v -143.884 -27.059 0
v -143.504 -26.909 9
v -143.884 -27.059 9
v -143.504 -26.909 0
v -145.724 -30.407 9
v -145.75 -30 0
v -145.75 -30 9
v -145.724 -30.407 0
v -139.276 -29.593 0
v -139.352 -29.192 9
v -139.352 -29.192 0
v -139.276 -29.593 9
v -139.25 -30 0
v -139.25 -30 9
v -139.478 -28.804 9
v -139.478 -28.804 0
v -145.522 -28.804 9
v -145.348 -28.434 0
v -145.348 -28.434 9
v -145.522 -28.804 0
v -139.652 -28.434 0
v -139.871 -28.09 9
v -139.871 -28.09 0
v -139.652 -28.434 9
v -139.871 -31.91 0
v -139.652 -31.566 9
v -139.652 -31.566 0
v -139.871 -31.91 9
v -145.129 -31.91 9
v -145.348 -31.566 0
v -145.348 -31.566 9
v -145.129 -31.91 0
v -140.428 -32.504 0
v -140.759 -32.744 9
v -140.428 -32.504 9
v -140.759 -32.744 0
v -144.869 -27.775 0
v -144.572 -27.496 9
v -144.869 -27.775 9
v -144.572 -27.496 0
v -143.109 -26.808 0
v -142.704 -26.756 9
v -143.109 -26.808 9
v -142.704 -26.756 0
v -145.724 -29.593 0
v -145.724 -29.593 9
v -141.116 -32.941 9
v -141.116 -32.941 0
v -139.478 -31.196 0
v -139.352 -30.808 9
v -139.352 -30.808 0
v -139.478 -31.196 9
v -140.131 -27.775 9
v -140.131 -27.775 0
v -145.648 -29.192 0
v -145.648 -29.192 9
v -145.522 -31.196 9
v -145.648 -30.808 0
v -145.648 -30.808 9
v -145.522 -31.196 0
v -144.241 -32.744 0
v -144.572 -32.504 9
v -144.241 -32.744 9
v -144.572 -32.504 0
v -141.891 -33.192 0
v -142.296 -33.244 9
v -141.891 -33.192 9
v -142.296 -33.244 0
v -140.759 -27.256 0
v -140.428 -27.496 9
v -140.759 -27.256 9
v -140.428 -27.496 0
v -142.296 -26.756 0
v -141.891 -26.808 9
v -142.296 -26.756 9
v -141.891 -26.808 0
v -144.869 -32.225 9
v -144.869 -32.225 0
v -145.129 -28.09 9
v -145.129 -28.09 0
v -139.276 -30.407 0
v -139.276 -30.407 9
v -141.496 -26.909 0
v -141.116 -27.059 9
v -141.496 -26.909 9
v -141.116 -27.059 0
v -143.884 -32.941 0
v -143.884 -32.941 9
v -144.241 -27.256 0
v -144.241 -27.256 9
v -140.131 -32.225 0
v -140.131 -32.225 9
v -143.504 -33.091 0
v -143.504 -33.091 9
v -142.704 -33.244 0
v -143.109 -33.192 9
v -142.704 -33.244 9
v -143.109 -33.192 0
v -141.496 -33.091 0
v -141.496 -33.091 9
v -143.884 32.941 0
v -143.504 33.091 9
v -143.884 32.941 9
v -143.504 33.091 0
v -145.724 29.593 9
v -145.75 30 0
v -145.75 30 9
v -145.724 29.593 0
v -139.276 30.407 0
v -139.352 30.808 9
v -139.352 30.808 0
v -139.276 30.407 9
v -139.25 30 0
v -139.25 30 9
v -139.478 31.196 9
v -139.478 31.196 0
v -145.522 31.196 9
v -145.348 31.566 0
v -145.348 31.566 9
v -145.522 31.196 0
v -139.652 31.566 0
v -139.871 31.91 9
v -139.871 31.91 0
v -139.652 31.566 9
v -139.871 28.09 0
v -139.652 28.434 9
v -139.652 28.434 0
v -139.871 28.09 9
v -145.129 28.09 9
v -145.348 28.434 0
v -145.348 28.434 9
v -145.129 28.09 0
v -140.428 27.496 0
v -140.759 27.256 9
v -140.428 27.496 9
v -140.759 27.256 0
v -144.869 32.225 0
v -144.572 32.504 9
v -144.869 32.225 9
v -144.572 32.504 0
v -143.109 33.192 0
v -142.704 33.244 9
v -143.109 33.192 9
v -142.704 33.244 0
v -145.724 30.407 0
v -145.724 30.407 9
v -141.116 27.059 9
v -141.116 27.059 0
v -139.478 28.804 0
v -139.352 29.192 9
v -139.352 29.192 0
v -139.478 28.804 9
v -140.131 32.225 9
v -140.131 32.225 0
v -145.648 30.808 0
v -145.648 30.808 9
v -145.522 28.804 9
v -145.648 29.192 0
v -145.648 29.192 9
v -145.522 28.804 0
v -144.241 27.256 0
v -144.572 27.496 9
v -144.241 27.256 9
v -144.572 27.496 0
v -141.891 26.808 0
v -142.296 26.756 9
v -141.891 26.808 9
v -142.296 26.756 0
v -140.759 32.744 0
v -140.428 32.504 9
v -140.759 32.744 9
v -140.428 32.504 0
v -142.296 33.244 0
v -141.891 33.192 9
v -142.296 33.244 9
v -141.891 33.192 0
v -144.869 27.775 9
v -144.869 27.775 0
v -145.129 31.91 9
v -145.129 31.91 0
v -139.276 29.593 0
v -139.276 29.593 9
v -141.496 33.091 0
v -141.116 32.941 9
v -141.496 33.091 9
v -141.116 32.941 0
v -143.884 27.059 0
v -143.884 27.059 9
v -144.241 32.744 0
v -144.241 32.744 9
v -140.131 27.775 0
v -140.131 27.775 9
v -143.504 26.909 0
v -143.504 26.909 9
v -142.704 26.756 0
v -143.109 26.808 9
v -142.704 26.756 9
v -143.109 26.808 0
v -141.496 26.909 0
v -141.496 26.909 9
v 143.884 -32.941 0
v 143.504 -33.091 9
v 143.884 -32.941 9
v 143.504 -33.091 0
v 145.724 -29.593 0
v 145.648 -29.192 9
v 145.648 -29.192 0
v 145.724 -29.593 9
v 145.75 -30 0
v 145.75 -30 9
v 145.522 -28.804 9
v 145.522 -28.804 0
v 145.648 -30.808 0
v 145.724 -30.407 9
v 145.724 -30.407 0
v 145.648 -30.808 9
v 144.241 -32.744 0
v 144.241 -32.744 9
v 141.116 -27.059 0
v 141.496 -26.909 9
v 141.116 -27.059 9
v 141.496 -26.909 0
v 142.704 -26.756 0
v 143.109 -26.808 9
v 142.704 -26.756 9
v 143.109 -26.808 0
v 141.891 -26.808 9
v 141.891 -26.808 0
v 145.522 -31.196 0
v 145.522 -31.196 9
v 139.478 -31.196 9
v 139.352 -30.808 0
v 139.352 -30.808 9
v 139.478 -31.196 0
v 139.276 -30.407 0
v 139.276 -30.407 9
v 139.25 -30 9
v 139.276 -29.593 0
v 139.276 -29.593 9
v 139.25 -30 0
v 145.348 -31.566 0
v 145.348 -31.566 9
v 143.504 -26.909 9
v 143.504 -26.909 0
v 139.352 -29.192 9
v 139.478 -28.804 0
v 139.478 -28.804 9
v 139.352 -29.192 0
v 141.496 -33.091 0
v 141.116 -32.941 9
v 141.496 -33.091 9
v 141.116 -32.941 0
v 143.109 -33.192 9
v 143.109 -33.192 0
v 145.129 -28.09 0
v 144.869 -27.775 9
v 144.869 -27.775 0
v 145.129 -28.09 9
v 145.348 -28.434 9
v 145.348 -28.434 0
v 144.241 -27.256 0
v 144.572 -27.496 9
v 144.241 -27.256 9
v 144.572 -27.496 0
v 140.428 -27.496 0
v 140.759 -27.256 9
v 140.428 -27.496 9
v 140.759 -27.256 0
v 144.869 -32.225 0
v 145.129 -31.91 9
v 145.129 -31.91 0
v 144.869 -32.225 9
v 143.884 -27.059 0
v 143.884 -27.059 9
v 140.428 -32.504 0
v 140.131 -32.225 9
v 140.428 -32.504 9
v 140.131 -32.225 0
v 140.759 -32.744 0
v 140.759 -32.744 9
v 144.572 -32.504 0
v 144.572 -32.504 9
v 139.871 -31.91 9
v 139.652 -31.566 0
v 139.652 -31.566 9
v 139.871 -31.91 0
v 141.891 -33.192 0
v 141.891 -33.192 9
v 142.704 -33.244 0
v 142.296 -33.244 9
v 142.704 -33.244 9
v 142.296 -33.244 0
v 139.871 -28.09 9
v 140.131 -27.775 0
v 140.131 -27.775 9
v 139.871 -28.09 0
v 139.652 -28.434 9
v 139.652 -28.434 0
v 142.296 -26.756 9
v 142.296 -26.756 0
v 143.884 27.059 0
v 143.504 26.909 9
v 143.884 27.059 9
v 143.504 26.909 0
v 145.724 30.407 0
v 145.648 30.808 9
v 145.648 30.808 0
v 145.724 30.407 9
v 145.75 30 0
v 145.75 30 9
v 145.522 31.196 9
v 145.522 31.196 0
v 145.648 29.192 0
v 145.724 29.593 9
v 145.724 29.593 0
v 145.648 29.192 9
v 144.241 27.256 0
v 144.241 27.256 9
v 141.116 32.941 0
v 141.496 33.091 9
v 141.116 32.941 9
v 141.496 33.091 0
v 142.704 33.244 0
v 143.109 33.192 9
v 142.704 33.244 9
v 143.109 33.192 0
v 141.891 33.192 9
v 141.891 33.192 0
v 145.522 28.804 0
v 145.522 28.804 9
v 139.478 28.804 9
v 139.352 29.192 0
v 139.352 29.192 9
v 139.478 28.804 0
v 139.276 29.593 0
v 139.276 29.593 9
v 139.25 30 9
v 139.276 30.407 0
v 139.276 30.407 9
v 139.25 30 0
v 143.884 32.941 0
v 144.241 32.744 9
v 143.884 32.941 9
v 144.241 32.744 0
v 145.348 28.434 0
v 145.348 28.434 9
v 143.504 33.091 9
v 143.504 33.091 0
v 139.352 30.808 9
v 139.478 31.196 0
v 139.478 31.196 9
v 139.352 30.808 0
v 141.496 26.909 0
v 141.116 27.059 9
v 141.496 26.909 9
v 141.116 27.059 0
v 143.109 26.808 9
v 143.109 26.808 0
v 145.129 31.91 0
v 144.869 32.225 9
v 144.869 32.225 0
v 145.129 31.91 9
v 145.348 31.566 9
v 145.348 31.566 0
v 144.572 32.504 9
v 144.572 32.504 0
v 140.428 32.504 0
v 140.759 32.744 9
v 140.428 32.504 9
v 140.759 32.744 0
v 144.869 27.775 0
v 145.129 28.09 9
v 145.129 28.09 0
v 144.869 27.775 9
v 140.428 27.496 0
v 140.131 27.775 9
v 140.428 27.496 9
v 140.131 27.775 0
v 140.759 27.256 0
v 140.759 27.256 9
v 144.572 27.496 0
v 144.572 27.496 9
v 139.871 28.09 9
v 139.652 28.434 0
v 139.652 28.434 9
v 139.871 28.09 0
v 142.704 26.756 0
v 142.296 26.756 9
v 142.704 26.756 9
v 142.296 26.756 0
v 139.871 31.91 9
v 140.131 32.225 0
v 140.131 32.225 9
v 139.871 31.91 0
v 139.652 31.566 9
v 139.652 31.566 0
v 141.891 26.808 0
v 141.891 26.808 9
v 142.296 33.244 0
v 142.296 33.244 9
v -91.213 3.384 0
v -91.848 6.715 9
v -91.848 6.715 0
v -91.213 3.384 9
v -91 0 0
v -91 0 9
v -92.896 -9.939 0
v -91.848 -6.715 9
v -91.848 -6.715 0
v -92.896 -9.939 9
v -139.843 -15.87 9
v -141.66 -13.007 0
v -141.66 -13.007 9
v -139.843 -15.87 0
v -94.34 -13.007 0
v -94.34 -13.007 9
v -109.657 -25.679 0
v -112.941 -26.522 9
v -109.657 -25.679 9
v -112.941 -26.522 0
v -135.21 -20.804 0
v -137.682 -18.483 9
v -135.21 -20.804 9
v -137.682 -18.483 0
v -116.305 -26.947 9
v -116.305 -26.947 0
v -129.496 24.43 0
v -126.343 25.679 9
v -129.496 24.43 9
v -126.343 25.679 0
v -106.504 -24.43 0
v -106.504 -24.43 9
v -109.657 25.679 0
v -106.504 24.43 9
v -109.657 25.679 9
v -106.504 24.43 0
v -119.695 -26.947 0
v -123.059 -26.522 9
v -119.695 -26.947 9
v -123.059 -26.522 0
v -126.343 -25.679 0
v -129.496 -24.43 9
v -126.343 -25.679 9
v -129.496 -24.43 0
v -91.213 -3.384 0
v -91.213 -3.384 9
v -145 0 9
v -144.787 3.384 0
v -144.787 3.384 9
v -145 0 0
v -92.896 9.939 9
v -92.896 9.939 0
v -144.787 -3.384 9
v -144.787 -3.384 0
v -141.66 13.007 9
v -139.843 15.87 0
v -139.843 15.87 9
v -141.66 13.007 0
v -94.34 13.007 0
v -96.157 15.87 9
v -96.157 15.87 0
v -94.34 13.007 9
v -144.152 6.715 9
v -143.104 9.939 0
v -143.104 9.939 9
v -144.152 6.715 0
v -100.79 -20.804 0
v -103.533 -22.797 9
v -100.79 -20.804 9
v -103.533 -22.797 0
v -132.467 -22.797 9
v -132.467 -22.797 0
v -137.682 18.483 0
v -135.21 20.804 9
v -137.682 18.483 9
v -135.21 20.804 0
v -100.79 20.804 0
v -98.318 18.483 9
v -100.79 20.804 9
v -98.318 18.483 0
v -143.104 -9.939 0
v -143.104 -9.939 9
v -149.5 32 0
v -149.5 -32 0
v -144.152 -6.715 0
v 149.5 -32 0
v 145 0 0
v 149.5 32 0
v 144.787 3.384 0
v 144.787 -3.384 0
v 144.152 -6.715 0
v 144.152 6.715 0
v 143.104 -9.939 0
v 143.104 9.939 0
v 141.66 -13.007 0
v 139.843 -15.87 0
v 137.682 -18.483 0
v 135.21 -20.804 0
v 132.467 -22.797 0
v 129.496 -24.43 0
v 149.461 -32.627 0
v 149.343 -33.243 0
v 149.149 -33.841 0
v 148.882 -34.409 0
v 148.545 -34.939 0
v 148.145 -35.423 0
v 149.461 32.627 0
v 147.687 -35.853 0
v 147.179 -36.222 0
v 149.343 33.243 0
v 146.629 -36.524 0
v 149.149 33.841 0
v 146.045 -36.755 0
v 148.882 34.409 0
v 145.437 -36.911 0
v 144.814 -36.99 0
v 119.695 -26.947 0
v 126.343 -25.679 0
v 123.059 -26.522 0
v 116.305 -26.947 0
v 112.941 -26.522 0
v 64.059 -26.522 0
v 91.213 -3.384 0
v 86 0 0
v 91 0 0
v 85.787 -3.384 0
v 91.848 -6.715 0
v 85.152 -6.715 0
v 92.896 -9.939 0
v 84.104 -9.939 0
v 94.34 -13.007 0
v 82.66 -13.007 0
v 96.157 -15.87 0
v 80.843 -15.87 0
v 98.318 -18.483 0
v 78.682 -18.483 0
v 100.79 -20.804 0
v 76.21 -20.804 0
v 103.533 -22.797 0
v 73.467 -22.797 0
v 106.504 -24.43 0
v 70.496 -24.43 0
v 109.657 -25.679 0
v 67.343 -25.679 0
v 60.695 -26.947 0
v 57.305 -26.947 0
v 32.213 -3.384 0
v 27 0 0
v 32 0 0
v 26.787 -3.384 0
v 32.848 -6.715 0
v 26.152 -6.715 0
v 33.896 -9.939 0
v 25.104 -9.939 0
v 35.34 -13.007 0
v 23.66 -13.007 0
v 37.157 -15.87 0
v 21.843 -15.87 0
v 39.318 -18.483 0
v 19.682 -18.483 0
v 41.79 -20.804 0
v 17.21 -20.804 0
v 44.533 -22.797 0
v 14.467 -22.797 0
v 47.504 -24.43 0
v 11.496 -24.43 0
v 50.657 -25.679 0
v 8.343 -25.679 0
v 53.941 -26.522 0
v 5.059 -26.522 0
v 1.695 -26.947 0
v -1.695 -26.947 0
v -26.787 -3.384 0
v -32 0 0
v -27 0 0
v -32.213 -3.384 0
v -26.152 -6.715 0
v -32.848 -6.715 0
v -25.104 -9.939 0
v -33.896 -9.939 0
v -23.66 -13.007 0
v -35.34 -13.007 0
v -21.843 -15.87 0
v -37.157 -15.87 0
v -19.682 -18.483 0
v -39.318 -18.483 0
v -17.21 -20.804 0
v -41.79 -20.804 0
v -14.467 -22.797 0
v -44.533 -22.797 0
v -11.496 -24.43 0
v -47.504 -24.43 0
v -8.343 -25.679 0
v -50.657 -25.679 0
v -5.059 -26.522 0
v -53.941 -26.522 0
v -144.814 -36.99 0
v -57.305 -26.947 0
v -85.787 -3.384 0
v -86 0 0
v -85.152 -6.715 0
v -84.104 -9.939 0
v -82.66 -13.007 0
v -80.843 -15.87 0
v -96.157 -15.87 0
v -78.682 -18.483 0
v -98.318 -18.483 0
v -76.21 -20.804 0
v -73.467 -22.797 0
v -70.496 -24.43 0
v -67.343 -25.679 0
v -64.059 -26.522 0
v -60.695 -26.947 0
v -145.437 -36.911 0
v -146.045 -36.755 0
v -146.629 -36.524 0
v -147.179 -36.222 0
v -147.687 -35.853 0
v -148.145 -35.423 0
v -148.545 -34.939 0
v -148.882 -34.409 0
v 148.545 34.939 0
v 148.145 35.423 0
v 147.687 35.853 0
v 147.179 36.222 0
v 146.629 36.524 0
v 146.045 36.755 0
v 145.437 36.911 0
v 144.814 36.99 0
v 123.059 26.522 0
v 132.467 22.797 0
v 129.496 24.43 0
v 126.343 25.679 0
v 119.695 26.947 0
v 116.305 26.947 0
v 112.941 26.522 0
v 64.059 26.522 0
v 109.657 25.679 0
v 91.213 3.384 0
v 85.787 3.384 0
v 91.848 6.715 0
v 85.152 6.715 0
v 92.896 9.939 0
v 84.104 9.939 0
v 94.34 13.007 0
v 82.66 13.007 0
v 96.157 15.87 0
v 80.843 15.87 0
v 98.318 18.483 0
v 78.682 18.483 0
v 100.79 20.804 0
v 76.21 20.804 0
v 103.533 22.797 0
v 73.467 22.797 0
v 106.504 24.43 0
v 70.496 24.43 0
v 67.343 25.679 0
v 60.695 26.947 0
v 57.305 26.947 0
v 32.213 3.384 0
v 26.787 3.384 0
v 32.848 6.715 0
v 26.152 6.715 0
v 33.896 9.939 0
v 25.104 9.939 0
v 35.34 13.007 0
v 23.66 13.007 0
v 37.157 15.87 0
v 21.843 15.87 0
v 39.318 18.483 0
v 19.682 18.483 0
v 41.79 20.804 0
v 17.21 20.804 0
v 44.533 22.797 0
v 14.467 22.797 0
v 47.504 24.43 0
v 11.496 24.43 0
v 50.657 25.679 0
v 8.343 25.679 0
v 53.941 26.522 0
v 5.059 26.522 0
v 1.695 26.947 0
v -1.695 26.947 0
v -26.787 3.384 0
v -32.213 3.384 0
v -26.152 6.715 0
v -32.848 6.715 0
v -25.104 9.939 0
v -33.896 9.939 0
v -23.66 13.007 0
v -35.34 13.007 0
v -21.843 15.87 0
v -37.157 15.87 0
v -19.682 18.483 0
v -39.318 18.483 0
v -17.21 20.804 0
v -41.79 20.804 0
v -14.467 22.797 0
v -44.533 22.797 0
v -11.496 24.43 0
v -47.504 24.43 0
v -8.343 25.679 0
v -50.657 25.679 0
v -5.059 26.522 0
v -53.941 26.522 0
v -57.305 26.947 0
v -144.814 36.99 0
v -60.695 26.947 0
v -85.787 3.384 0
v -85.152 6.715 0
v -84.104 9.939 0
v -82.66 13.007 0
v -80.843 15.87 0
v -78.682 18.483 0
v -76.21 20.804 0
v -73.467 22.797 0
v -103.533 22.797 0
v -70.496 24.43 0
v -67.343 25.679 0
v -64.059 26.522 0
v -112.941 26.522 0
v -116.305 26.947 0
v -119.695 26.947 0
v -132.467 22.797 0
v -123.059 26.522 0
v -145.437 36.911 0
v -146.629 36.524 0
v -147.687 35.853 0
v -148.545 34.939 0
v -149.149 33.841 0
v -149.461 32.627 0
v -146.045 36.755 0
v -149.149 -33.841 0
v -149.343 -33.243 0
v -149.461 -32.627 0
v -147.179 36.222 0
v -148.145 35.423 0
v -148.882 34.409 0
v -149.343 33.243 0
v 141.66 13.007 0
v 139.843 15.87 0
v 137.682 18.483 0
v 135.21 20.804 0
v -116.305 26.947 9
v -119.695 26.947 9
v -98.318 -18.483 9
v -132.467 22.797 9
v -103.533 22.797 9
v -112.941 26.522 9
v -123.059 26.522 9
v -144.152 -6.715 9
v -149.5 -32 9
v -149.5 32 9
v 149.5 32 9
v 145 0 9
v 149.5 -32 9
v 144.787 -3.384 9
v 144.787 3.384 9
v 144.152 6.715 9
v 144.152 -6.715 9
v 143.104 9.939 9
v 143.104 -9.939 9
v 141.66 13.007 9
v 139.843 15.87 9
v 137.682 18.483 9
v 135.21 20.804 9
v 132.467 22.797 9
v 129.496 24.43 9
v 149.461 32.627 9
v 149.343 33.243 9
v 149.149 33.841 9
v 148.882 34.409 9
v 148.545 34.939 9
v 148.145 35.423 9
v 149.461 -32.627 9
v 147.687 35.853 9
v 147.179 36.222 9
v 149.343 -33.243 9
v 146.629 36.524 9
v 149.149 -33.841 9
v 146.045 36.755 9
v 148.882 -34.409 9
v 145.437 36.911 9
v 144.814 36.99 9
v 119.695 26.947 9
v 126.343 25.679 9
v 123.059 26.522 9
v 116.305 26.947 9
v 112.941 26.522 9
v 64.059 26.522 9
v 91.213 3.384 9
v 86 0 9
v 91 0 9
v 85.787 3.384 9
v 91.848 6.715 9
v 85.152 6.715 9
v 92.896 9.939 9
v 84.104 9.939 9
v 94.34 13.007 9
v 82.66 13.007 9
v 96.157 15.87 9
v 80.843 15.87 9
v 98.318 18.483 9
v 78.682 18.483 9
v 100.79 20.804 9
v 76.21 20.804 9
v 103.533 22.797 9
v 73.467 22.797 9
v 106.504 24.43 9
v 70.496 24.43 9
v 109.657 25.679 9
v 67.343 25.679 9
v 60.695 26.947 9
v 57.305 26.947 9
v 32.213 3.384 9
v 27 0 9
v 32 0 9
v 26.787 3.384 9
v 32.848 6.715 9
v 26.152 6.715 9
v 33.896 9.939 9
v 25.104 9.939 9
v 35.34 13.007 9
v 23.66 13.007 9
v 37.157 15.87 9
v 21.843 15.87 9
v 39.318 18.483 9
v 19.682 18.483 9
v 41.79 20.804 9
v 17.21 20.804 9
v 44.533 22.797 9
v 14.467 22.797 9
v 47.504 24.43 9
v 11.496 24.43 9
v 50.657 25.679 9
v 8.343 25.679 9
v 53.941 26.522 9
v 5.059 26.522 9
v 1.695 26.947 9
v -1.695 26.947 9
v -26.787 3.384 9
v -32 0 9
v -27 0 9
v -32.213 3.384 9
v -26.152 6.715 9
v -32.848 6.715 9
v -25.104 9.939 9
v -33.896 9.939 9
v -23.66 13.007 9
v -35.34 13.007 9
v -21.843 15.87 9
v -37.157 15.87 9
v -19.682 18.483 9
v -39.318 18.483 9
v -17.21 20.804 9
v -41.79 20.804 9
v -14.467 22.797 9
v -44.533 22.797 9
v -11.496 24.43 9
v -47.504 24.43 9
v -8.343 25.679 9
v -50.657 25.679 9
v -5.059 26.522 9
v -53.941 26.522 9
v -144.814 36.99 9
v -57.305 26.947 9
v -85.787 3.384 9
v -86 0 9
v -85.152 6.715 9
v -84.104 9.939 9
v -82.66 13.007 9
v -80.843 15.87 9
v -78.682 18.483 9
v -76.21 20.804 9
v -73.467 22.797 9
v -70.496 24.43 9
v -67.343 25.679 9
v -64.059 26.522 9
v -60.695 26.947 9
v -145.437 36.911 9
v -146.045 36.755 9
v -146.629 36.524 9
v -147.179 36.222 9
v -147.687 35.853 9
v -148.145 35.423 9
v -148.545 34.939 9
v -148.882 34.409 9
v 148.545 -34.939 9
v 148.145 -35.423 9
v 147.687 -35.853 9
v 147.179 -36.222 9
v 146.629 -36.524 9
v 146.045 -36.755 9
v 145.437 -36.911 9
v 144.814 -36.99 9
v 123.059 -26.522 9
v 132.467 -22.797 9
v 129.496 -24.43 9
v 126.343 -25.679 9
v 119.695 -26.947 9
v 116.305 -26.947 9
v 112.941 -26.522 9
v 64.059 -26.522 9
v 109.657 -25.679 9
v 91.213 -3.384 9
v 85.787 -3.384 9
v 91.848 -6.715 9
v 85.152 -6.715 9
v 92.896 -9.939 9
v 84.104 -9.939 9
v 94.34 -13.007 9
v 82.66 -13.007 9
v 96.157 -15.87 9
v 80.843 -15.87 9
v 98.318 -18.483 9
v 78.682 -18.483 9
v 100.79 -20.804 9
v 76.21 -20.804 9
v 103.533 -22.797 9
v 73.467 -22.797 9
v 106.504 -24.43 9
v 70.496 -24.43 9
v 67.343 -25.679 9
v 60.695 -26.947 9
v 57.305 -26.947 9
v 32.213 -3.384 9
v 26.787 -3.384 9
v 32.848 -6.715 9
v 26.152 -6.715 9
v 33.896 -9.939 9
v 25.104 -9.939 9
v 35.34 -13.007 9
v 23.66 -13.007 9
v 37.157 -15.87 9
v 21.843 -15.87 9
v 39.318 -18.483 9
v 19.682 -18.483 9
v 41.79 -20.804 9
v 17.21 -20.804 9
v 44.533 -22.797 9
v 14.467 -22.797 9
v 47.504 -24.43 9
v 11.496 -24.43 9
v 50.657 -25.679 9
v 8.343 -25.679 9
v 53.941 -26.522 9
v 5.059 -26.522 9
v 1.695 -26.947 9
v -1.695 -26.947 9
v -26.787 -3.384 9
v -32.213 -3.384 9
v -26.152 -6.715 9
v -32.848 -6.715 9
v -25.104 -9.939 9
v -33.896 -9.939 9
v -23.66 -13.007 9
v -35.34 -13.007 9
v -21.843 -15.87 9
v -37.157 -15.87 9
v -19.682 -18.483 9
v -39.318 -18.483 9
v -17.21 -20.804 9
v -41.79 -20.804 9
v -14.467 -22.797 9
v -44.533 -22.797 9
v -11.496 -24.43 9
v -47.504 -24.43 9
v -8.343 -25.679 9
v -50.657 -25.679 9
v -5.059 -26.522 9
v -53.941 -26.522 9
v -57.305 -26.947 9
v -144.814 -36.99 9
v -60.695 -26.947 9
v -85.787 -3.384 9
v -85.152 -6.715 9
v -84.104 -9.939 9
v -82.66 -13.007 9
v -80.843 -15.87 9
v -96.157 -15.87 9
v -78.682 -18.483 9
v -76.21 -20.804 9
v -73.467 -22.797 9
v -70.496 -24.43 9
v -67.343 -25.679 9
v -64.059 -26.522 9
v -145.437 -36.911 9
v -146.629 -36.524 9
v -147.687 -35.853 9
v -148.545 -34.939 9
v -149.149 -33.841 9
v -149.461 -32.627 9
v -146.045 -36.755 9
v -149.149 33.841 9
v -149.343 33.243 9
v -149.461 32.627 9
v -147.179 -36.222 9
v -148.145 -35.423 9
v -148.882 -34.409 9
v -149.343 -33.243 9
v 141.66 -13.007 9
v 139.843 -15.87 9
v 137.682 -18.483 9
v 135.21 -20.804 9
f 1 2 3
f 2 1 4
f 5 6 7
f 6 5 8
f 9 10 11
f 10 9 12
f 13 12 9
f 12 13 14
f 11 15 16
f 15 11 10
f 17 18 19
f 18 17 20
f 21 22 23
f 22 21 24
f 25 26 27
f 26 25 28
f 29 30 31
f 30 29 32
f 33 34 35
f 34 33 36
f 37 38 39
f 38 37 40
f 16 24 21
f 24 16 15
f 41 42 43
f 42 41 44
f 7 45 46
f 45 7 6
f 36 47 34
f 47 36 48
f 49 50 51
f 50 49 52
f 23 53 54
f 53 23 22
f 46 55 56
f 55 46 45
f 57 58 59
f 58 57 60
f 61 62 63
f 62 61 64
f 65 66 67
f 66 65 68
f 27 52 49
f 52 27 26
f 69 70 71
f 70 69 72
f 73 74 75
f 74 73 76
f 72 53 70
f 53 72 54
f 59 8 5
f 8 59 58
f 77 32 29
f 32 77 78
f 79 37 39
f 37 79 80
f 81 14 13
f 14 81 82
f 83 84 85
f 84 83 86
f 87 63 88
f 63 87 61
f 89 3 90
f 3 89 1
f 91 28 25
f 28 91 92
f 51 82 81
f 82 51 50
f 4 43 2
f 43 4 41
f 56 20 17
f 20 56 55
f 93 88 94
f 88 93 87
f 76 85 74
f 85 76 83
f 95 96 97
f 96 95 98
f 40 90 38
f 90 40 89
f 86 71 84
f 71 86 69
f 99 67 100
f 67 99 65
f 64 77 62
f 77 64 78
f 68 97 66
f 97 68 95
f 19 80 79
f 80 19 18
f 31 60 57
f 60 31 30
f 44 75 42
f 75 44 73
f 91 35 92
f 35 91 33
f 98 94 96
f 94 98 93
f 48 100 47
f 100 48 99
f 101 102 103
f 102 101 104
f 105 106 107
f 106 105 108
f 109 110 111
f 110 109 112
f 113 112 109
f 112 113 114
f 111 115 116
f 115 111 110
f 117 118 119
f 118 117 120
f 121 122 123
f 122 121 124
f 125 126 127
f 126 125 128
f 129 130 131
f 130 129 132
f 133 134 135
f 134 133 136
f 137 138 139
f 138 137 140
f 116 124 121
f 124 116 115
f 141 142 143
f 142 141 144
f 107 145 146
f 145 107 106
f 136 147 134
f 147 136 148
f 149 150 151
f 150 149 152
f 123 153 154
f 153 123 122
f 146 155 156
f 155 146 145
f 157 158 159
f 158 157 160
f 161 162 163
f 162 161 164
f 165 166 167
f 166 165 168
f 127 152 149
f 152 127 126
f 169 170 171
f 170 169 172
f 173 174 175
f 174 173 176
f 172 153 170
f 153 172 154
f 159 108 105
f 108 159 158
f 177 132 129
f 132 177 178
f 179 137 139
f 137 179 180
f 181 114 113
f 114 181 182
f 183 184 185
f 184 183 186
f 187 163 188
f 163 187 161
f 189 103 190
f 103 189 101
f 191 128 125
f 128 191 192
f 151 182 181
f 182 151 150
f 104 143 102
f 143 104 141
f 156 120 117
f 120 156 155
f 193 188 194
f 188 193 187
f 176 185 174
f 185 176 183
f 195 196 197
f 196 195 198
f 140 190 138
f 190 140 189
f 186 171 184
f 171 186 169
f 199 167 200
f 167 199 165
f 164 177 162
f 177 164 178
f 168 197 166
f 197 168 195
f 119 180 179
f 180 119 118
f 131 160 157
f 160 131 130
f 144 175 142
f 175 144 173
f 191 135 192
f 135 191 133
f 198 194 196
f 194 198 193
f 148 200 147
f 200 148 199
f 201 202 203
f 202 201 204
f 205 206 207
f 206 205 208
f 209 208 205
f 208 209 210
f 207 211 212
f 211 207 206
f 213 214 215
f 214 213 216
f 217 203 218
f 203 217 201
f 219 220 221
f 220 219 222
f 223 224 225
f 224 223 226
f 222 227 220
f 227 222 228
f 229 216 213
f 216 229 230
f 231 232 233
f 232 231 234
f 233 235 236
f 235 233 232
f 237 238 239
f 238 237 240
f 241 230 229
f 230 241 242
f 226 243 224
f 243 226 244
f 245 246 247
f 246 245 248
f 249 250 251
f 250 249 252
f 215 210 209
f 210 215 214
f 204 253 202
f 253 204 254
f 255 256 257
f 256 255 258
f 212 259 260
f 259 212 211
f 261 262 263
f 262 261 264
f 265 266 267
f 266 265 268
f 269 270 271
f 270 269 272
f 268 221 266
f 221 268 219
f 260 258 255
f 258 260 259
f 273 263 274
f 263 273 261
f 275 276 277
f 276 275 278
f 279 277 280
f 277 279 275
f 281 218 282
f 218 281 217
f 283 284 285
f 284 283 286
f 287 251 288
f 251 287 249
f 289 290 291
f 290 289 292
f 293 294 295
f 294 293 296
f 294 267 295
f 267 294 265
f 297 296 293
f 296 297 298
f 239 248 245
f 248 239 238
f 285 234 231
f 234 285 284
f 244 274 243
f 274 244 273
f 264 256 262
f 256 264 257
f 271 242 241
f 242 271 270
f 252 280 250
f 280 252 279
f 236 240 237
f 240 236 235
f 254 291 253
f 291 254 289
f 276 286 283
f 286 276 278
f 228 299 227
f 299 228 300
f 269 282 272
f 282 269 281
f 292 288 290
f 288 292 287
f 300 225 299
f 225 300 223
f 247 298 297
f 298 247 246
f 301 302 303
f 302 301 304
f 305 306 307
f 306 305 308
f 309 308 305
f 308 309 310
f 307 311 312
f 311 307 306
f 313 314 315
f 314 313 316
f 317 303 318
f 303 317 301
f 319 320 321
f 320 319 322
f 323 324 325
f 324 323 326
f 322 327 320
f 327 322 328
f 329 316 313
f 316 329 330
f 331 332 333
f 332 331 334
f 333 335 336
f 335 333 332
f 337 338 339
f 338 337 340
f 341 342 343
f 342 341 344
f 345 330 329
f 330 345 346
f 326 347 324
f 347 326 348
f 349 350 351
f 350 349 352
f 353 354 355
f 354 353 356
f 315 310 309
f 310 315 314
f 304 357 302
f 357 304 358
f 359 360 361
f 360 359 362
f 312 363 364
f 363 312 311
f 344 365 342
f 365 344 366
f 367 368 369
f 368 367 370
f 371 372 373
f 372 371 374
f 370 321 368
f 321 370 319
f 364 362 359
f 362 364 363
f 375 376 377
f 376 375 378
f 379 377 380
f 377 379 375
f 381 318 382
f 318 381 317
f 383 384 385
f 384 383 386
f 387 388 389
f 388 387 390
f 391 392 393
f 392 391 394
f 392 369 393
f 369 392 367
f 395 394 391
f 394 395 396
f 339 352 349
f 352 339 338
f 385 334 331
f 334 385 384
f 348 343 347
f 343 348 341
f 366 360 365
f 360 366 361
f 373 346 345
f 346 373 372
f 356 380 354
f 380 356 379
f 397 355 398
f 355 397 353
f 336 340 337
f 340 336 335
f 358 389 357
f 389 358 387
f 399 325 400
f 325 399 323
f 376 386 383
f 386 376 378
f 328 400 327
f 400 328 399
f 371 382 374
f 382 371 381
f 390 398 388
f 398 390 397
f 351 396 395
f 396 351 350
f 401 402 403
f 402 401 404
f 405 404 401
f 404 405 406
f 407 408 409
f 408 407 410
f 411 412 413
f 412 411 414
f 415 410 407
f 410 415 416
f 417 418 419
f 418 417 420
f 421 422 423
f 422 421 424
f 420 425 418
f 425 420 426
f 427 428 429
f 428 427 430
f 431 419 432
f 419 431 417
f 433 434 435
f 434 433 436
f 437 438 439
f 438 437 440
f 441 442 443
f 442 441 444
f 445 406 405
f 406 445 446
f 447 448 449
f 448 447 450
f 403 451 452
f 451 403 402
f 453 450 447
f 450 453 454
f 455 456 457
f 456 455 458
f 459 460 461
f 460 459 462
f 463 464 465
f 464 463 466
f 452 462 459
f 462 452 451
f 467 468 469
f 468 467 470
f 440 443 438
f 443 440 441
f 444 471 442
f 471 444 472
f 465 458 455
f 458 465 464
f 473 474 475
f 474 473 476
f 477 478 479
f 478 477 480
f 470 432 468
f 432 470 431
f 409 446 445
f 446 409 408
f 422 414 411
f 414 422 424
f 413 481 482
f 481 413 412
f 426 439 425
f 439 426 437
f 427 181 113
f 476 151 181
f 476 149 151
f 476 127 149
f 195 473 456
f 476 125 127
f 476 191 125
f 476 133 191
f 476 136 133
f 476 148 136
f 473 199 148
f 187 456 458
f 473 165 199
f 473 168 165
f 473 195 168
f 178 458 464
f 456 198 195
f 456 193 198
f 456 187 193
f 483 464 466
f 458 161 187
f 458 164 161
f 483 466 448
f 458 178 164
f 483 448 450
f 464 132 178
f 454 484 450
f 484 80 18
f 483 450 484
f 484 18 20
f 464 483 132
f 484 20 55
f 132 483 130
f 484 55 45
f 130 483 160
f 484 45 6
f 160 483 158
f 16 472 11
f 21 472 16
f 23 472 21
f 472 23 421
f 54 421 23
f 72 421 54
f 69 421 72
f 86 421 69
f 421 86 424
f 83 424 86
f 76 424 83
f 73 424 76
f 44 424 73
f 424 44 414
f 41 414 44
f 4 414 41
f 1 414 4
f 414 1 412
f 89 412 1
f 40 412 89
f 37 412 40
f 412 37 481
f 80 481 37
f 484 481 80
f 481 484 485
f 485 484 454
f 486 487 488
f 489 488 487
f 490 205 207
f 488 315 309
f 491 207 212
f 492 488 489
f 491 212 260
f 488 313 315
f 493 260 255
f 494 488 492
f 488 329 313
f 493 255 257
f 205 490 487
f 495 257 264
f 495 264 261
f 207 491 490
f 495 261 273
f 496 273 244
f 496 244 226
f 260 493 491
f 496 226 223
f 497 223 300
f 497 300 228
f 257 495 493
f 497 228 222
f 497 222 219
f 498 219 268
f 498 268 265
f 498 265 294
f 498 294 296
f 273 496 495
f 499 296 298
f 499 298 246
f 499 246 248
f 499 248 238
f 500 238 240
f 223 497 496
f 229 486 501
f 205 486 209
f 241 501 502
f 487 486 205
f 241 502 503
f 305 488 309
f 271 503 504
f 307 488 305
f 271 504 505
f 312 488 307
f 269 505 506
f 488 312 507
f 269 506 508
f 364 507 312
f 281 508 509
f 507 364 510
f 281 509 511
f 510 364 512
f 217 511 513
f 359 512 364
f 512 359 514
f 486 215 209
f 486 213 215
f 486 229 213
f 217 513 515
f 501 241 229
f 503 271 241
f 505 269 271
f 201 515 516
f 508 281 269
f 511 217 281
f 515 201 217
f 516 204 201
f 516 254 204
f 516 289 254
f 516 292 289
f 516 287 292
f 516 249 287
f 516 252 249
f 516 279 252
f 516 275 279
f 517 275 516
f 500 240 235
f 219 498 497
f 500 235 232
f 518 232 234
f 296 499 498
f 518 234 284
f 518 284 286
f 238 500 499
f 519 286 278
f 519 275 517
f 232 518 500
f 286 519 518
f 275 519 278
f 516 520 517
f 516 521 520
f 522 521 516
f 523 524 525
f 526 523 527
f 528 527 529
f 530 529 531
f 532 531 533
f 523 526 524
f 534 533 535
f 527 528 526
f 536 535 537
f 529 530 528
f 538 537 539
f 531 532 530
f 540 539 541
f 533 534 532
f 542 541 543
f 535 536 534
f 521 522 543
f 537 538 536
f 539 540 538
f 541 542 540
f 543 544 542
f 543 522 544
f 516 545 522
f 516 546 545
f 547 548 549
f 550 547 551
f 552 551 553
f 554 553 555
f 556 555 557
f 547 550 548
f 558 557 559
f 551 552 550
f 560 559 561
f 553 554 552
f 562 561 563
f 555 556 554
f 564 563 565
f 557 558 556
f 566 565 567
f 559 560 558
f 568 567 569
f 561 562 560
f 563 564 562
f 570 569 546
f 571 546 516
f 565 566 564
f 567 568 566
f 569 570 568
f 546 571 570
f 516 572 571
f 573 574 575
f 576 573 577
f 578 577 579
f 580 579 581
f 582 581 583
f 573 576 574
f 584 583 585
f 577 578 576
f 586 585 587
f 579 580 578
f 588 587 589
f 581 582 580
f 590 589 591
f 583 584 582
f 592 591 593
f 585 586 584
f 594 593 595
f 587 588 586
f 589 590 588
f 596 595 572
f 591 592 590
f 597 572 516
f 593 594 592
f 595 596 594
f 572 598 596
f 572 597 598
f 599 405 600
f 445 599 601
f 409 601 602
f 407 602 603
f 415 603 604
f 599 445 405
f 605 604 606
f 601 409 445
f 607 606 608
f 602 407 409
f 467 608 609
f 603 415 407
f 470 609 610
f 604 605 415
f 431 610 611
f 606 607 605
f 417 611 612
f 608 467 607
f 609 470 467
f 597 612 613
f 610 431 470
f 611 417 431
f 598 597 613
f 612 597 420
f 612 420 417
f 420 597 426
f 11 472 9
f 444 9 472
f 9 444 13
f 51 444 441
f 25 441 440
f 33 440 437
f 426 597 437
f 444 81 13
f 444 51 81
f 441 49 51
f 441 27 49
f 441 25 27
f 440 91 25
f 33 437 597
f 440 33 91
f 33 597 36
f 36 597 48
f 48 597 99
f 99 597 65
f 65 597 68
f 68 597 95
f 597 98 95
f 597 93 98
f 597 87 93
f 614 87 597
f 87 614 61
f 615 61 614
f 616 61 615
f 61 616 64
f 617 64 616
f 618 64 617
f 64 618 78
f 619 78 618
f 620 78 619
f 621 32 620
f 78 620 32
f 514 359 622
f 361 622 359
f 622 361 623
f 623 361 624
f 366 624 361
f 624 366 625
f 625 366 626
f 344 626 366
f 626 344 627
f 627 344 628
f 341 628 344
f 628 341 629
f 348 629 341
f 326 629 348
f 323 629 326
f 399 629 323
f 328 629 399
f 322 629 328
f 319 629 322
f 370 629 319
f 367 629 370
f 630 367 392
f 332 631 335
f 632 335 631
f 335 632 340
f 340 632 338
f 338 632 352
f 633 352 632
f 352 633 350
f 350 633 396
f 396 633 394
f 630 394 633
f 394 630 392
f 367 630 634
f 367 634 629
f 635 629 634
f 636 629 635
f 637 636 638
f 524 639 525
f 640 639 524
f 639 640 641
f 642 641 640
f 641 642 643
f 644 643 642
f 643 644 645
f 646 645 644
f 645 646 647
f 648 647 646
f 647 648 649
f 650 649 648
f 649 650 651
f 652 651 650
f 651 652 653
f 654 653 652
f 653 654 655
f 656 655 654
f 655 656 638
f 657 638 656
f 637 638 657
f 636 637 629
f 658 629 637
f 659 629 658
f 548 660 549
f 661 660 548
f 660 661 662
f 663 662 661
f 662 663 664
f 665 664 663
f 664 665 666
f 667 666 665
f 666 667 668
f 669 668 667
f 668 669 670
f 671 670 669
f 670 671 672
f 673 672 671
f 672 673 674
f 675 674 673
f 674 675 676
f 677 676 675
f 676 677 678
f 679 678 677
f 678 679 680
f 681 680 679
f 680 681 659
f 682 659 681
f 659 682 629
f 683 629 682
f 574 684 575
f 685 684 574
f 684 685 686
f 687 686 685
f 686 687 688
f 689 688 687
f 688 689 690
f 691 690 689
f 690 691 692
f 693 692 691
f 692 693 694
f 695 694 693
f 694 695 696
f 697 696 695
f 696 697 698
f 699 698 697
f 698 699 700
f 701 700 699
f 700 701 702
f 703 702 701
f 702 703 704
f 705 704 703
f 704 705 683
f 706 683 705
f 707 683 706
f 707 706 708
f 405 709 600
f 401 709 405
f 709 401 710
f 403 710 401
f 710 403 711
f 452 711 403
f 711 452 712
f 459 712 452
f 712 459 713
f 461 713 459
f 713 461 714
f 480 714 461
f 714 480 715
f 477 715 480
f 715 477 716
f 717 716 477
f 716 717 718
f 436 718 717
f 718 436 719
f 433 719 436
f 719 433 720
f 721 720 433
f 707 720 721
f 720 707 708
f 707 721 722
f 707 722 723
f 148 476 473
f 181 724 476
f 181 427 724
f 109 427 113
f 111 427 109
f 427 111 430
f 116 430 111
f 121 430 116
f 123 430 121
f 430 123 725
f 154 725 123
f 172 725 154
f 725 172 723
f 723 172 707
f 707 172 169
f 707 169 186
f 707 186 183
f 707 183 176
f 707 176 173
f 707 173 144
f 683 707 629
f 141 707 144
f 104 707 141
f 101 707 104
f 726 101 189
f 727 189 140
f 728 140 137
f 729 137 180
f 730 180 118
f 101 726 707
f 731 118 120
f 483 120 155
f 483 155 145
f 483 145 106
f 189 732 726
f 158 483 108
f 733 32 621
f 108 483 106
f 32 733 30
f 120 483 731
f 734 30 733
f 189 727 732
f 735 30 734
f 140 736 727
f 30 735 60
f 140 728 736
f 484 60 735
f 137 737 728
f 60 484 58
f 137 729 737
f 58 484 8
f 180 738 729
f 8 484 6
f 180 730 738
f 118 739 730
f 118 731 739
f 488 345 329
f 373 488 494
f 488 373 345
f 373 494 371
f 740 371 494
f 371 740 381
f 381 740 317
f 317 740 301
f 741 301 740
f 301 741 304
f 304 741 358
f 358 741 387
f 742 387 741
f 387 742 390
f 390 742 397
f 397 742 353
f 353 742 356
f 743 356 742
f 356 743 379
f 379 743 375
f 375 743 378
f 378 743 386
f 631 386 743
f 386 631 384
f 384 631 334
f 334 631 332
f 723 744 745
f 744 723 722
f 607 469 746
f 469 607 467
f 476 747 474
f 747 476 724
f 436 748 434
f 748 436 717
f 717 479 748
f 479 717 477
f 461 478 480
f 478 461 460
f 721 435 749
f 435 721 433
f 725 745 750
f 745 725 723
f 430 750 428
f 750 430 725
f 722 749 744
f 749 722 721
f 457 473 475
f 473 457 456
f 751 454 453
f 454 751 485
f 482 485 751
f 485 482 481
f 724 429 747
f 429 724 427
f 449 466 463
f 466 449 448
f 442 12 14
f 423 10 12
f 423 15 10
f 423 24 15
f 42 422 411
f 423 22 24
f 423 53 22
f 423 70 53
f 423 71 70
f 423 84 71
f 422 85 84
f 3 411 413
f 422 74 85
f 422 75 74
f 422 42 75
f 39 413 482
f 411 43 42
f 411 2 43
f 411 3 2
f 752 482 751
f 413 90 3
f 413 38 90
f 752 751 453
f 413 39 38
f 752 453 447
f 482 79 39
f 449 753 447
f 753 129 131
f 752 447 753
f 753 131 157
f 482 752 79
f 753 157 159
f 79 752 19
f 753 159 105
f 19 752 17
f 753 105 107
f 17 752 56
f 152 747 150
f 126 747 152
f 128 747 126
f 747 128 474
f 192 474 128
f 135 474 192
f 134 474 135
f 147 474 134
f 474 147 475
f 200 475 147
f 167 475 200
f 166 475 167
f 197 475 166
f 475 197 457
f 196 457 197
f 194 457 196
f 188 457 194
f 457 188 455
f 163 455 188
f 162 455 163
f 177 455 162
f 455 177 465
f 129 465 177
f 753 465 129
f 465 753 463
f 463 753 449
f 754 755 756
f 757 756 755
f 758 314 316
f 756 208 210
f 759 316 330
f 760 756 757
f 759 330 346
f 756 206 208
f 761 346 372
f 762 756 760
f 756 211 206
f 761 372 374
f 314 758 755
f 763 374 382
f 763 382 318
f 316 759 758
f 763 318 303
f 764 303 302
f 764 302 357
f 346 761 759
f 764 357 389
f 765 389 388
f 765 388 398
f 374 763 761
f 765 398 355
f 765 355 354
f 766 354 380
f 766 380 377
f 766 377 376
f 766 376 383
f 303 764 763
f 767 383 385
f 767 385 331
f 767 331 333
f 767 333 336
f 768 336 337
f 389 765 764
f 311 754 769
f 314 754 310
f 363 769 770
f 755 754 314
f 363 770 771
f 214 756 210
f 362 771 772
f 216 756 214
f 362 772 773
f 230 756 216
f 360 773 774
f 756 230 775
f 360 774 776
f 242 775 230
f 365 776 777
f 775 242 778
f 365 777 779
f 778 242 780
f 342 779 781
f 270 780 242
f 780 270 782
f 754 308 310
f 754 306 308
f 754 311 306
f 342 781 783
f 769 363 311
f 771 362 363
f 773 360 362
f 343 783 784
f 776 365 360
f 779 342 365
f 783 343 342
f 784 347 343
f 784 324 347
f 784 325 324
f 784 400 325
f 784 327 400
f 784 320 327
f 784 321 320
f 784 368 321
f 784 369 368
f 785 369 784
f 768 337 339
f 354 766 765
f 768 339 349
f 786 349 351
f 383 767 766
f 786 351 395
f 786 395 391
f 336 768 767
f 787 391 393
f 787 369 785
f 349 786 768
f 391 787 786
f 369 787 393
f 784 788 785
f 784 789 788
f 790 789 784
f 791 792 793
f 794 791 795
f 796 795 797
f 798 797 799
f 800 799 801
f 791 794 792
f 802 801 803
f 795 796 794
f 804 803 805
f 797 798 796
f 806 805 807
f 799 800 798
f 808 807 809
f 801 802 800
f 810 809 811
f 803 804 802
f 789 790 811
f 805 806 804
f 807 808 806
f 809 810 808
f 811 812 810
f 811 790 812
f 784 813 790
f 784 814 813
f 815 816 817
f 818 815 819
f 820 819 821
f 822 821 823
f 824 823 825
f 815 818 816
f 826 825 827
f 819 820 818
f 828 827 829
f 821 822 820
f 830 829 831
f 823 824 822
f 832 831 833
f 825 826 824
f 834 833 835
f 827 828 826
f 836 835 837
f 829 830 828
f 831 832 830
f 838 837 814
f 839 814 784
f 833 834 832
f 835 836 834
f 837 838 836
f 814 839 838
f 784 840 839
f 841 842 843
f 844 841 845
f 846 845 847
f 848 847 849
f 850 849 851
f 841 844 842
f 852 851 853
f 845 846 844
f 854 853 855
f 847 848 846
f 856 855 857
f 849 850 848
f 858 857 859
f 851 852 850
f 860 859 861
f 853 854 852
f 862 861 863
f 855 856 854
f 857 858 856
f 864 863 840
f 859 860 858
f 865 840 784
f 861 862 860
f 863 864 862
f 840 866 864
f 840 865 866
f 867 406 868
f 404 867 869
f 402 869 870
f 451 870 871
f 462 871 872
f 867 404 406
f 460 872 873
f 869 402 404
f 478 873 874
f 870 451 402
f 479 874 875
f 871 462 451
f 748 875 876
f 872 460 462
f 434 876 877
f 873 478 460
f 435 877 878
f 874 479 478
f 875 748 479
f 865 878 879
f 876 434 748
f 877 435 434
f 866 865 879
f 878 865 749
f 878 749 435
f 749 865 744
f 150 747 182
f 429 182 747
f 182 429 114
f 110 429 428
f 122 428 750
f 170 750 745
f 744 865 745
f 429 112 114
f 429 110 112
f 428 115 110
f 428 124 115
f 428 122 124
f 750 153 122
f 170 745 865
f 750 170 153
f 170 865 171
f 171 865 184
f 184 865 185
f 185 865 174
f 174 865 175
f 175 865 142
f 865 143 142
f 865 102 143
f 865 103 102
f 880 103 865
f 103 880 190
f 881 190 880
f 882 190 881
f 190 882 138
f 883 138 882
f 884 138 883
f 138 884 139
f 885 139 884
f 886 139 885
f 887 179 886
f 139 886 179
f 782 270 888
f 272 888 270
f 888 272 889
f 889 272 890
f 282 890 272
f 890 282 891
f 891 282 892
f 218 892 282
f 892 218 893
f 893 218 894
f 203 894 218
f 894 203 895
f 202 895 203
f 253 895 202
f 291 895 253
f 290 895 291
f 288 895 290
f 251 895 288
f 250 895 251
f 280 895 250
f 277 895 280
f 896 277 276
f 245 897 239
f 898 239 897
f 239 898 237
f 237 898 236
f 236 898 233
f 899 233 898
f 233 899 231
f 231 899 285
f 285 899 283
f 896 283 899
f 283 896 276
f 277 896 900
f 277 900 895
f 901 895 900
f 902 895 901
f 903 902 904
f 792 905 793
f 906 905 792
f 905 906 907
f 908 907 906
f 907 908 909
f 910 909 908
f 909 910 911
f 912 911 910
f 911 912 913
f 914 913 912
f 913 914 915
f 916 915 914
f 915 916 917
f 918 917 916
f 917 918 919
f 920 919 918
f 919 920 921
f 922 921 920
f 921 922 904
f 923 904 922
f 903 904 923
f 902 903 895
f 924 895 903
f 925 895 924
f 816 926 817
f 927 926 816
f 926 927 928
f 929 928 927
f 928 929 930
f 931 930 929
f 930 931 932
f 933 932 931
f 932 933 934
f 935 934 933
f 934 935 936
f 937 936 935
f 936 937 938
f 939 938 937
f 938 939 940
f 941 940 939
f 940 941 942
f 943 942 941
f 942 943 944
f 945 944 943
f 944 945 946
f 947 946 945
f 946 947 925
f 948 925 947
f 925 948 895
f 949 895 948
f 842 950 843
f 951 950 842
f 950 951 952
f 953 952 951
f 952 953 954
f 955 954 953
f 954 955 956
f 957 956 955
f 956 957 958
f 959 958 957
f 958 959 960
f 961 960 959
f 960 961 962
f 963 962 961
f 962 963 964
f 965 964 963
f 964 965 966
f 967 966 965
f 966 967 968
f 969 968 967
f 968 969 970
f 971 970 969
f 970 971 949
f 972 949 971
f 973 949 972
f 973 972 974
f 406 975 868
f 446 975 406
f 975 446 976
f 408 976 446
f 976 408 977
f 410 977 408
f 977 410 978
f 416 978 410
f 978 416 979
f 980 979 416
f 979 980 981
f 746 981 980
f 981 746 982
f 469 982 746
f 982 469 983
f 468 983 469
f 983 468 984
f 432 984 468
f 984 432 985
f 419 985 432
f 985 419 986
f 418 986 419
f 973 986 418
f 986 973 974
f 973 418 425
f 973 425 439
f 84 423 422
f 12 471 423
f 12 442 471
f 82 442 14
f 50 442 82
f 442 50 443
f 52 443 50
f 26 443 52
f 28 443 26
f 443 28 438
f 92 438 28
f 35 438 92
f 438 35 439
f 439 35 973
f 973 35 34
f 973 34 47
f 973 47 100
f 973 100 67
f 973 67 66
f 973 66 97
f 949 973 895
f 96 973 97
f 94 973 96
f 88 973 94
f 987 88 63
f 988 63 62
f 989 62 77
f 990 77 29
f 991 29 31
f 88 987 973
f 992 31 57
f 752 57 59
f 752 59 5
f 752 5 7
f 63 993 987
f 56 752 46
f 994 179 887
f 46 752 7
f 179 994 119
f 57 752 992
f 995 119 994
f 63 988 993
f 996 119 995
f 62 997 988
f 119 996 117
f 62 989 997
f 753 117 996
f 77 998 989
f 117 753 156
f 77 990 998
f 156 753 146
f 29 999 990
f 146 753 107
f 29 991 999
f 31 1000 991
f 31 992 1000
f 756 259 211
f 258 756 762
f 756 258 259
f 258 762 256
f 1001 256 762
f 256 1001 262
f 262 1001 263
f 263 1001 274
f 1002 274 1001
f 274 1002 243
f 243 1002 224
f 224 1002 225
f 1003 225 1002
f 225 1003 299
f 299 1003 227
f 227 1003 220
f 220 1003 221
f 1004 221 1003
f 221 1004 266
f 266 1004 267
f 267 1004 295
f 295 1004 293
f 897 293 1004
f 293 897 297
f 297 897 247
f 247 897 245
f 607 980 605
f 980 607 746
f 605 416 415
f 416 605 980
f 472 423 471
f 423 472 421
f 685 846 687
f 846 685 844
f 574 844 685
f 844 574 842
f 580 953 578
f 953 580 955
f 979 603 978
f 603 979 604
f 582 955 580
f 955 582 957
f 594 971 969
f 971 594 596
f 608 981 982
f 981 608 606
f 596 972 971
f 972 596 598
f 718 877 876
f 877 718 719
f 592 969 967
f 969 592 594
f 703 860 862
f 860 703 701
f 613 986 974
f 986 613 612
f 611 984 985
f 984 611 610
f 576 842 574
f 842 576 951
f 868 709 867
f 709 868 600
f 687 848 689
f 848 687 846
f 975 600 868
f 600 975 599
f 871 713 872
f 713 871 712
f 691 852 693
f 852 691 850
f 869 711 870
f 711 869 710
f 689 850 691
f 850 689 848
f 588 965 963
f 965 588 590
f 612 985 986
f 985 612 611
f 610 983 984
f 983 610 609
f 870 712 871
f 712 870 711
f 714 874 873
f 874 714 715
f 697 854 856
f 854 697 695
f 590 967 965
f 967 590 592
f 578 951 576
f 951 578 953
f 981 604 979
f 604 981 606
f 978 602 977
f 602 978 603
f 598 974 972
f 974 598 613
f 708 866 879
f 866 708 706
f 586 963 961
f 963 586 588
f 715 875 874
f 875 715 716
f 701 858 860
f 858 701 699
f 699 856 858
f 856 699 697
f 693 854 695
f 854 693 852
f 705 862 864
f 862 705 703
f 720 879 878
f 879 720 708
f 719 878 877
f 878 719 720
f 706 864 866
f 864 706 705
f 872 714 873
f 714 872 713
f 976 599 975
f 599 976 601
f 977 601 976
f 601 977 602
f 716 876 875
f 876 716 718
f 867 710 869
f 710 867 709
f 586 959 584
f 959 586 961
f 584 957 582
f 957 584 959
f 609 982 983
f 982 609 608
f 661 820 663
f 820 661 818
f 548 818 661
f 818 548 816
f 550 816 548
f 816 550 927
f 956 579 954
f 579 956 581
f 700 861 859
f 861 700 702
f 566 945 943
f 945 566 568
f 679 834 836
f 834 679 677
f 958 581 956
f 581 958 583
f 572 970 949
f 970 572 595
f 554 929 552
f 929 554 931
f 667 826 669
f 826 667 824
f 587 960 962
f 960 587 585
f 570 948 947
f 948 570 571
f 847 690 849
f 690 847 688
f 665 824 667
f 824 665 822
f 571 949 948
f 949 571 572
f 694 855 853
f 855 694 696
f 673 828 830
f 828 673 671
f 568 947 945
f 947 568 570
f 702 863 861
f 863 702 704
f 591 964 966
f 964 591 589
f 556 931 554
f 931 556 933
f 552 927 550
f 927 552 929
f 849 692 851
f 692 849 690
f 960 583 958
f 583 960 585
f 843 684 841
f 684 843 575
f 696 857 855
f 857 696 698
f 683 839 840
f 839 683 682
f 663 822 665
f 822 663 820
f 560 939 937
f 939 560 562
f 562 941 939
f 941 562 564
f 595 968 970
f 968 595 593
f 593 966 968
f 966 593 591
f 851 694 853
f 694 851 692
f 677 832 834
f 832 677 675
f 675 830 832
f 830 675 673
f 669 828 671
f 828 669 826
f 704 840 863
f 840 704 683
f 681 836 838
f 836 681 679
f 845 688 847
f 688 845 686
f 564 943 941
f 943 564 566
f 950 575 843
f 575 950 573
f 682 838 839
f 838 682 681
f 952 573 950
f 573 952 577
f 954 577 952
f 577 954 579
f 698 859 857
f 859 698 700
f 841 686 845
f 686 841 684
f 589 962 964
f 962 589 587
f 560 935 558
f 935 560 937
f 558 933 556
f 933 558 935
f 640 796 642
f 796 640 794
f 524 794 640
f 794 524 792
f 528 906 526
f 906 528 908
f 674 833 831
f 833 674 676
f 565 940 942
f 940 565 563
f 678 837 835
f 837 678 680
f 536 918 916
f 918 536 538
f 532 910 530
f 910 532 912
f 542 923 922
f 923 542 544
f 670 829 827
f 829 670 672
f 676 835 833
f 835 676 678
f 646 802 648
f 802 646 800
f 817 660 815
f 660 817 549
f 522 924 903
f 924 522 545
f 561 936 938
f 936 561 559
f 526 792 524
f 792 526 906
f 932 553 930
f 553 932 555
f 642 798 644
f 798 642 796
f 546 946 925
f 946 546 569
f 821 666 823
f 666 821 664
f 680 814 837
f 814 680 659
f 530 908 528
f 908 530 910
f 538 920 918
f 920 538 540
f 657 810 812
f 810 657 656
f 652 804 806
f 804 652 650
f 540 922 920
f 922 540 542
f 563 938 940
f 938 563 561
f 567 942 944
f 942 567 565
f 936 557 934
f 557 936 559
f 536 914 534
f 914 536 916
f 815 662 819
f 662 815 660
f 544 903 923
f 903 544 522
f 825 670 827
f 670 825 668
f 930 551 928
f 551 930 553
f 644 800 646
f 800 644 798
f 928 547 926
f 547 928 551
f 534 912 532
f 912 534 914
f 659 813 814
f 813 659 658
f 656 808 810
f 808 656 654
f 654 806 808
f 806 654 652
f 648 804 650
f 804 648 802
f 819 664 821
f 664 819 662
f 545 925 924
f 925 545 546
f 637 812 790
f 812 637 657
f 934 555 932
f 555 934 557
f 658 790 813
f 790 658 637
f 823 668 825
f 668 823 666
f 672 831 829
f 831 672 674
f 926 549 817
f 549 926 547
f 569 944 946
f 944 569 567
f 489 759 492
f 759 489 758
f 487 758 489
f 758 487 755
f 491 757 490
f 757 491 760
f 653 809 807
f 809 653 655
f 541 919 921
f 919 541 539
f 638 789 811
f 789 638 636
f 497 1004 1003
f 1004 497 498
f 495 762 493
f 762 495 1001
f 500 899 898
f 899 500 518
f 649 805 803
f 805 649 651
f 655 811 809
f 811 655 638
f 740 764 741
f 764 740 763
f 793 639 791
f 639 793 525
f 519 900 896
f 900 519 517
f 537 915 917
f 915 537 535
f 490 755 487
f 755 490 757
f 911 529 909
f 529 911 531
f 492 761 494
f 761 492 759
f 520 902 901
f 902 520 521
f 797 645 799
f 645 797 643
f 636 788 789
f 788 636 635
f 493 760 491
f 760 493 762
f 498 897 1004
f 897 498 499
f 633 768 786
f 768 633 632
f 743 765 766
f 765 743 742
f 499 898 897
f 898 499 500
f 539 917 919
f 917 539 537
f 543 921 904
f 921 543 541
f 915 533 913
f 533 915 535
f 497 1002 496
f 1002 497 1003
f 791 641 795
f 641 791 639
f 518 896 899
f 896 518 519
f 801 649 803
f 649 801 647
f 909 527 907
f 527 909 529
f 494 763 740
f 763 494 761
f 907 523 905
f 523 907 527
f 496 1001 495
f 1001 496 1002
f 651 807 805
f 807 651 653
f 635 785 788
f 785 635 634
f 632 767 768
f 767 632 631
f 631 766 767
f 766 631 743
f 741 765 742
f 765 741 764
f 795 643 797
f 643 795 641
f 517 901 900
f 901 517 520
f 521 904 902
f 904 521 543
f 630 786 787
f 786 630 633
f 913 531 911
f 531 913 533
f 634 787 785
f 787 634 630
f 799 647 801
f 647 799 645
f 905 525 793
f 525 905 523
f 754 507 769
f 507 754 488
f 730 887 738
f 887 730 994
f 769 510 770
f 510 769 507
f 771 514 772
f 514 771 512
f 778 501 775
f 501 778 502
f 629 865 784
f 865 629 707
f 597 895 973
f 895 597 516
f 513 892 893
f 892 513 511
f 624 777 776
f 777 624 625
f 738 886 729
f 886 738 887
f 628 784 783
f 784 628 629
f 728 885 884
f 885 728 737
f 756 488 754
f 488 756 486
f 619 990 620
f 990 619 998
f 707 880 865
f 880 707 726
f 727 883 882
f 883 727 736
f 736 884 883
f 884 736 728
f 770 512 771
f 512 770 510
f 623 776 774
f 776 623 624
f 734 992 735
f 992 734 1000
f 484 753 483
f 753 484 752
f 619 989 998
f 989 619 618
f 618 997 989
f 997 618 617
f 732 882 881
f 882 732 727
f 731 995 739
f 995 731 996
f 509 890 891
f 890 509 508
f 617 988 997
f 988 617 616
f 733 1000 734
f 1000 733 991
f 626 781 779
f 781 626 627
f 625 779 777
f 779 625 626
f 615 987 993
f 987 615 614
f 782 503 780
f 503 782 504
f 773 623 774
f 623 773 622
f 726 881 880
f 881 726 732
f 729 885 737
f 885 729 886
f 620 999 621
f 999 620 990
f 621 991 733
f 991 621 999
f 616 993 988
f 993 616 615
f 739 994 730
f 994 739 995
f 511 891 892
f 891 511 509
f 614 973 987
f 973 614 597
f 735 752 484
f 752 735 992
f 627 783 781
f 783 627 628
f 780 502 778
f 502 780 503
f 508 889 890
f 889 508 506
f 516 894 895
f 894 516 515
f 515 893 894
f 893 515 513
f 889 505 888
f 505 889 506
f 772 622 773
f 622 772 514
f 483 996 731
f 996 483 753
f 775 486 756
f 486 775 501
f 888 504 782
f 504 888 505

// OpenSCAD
$fn = 50;


difference() {
	union() {
		hull() {
			translate(v = [-144.5000000000, 32.0000000000, 0]) {
				cylinder(h = 9, r = 5);
			}
			translate(v = [144.5000000000, 32.0000000000, 0]) {
				cylinder(h = 9, r = 5);
			}
			translate(v = [-144.5000000000, -32.0000000000, 0]) {
				cylinder(h = 9, r = 5);
			}
			translate(v = [144.5000000000, -32.0000000000, 0]) {
				cylinder(h = 9, r = 5);
			}
		}
	}
	union() {
		#translate(v = [-142.5000000000, -30.0000000000, -100.0000000000]) {
			cylinder(h = 200, r = 3.2500000000);
		}
		#translate(v = [-142.5000000000, 30.0000000000, -100.0000000000]) {
			cylinder(h = 200, r = 3.2500000000);
		}
		#translate(v = [142.5000000000, -30.0000000000, -100.0000000000]) {
			cylinder(h = 200, r = 3.2500000000);
		}
		#translate(v = [142.5000000000, 30.0000000000, -100.0000000000]) {
			cylinder(h = 200, r = 3.2500000000);
		}
		#translate(v = [-118.0000000000, 0, 0]) {
			cylinder(h = 9, r = 27.0000000000);
		}
		#translate(v = [-59.0000000000, 0, 0]) {
			cylinder(h = 9, r = 27.0000000000);
		}
		#cylinder(h = 9, r = 27.0000000000);
		#translate(v = [59.0000000000, 0, 0]) {
			cylinder(h = 9, r = 27.0000000000);
		}
		#translate(v = [118.0000000000, 0, 0]) {
			cylinder(h = 9, r = 27.0000000000);
		}
	}
}
